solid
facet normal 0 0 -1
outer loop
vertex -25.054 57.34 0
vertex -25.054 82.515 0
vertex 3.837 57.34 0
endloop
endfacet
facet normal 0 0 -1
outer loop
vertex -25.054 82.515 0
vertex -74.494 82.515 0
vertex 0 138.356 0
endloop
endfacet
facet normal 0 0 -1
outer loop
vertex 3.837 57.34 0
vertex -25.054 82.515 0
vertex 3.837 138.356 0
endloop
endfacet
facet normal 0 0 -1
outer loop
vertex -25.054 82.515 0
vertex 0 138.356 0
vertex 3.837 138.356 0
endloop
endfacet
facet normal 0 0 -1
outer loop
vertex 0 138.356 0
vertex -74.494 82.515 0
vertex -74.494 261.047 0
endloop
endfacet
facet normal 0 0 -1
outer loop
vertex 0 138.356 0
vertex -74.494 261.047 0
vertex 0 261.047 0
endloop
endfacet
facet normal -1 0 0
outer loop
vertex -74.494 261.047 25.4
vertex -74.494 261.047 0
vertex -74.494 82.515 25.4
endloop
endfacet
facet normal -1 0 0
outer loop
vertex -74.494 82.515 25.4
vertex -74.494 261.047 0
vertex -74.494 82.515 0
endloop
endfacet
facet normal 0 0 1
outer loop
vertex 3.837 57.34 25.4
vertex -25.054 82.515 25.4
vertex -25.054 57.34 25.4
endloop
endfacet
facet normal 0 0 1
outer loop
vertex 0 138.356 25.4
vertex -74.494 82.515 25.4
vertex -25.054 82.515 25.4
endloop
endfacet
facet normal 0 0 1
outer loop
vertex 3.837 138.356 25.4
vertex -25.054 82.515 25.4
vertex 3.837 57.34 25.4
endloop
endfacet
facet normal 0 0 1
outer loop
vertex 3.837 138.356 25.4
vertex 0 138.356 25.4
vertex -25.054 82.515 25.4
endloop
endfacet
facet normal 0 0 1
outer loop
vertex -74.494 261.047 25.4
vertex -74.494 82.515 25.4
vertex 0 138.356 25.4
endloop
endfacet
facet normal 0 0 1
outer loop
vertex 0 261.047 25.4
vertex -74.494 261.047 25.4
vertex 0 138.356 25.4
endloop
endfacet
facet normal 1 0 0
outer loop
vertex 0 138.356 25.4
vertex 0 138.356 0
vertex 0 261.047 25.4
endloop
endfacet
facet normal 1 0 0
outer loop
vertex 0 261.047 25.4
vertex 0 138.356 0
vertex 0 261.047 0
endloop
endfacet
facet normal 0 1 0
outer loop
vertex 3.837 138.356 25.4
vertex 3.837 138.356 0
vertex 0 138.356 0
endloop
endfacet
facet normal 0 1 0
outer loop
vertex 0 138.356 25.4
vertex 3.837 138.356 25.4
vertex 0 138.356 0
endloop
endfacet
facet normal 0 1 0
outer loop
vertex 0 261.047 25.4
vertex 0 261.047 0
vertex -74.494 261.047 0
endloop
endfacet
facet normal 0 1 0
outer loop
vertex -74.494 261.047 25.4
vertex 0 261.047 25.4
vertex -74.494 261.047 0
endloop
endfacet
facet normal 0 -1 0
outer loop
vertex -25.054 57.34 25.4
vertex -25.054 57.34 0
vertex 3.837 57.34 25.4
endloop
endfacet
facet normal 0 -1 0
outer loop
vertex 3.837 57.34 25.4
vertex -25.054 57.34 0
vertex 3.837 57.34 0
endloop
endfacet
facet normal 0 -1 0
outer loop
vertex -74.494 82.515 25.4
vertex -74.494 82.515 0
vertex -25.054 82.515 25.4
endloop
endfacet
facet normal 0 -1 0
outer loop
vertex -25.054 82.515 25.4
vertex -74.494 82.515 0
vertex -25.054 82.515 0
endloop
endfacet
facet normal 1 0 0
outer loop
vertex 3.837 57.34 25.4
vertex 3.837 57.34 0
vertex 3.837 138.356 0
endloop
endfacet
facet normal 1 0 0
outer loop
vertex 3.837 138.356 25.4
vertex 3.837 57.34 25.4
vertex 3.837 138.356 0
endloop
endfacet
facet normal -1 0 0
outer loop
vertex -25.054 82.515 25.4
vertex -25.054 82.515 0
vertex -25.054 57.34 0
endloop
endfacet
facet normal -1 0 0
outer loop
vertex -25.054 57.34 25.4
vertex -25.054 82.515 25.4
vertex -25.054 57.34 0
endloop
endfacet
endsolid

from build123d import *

# Parameters (mm, degrees)
F0_W     = 25.0537917018
F0_H     = 55.8406859636
F1_DEPTH = 25.4


with BuildPart() as f1:
    # F0 (on Top) → F1 (new body)
    with BuildSketch(Plane.XY):
        Polygon((0, 138.3560597897), (0, 82.515373826), (-25.0537917018, 82.515373826), (-25.0537917018, 57.3403835297), (3.8365423679, 57.3403835297), (3.8365423679, 138.3560597897), align=None)
        with Locations((-12.5268958509, 110.4357168078)):
            Rectangle(F0_W, F0_H)
        Polygon((-74.49362427, 82.515373826), (-25.0537917018, 82.515373826), (-25.0537917018, 138.3560597897), (0, 138.3560597897), (0, 261.0465288162), (-74.49362427, 261.0465288162), align=None)
    extrude(amount=F1_DEPTH)


solid = f1.part
